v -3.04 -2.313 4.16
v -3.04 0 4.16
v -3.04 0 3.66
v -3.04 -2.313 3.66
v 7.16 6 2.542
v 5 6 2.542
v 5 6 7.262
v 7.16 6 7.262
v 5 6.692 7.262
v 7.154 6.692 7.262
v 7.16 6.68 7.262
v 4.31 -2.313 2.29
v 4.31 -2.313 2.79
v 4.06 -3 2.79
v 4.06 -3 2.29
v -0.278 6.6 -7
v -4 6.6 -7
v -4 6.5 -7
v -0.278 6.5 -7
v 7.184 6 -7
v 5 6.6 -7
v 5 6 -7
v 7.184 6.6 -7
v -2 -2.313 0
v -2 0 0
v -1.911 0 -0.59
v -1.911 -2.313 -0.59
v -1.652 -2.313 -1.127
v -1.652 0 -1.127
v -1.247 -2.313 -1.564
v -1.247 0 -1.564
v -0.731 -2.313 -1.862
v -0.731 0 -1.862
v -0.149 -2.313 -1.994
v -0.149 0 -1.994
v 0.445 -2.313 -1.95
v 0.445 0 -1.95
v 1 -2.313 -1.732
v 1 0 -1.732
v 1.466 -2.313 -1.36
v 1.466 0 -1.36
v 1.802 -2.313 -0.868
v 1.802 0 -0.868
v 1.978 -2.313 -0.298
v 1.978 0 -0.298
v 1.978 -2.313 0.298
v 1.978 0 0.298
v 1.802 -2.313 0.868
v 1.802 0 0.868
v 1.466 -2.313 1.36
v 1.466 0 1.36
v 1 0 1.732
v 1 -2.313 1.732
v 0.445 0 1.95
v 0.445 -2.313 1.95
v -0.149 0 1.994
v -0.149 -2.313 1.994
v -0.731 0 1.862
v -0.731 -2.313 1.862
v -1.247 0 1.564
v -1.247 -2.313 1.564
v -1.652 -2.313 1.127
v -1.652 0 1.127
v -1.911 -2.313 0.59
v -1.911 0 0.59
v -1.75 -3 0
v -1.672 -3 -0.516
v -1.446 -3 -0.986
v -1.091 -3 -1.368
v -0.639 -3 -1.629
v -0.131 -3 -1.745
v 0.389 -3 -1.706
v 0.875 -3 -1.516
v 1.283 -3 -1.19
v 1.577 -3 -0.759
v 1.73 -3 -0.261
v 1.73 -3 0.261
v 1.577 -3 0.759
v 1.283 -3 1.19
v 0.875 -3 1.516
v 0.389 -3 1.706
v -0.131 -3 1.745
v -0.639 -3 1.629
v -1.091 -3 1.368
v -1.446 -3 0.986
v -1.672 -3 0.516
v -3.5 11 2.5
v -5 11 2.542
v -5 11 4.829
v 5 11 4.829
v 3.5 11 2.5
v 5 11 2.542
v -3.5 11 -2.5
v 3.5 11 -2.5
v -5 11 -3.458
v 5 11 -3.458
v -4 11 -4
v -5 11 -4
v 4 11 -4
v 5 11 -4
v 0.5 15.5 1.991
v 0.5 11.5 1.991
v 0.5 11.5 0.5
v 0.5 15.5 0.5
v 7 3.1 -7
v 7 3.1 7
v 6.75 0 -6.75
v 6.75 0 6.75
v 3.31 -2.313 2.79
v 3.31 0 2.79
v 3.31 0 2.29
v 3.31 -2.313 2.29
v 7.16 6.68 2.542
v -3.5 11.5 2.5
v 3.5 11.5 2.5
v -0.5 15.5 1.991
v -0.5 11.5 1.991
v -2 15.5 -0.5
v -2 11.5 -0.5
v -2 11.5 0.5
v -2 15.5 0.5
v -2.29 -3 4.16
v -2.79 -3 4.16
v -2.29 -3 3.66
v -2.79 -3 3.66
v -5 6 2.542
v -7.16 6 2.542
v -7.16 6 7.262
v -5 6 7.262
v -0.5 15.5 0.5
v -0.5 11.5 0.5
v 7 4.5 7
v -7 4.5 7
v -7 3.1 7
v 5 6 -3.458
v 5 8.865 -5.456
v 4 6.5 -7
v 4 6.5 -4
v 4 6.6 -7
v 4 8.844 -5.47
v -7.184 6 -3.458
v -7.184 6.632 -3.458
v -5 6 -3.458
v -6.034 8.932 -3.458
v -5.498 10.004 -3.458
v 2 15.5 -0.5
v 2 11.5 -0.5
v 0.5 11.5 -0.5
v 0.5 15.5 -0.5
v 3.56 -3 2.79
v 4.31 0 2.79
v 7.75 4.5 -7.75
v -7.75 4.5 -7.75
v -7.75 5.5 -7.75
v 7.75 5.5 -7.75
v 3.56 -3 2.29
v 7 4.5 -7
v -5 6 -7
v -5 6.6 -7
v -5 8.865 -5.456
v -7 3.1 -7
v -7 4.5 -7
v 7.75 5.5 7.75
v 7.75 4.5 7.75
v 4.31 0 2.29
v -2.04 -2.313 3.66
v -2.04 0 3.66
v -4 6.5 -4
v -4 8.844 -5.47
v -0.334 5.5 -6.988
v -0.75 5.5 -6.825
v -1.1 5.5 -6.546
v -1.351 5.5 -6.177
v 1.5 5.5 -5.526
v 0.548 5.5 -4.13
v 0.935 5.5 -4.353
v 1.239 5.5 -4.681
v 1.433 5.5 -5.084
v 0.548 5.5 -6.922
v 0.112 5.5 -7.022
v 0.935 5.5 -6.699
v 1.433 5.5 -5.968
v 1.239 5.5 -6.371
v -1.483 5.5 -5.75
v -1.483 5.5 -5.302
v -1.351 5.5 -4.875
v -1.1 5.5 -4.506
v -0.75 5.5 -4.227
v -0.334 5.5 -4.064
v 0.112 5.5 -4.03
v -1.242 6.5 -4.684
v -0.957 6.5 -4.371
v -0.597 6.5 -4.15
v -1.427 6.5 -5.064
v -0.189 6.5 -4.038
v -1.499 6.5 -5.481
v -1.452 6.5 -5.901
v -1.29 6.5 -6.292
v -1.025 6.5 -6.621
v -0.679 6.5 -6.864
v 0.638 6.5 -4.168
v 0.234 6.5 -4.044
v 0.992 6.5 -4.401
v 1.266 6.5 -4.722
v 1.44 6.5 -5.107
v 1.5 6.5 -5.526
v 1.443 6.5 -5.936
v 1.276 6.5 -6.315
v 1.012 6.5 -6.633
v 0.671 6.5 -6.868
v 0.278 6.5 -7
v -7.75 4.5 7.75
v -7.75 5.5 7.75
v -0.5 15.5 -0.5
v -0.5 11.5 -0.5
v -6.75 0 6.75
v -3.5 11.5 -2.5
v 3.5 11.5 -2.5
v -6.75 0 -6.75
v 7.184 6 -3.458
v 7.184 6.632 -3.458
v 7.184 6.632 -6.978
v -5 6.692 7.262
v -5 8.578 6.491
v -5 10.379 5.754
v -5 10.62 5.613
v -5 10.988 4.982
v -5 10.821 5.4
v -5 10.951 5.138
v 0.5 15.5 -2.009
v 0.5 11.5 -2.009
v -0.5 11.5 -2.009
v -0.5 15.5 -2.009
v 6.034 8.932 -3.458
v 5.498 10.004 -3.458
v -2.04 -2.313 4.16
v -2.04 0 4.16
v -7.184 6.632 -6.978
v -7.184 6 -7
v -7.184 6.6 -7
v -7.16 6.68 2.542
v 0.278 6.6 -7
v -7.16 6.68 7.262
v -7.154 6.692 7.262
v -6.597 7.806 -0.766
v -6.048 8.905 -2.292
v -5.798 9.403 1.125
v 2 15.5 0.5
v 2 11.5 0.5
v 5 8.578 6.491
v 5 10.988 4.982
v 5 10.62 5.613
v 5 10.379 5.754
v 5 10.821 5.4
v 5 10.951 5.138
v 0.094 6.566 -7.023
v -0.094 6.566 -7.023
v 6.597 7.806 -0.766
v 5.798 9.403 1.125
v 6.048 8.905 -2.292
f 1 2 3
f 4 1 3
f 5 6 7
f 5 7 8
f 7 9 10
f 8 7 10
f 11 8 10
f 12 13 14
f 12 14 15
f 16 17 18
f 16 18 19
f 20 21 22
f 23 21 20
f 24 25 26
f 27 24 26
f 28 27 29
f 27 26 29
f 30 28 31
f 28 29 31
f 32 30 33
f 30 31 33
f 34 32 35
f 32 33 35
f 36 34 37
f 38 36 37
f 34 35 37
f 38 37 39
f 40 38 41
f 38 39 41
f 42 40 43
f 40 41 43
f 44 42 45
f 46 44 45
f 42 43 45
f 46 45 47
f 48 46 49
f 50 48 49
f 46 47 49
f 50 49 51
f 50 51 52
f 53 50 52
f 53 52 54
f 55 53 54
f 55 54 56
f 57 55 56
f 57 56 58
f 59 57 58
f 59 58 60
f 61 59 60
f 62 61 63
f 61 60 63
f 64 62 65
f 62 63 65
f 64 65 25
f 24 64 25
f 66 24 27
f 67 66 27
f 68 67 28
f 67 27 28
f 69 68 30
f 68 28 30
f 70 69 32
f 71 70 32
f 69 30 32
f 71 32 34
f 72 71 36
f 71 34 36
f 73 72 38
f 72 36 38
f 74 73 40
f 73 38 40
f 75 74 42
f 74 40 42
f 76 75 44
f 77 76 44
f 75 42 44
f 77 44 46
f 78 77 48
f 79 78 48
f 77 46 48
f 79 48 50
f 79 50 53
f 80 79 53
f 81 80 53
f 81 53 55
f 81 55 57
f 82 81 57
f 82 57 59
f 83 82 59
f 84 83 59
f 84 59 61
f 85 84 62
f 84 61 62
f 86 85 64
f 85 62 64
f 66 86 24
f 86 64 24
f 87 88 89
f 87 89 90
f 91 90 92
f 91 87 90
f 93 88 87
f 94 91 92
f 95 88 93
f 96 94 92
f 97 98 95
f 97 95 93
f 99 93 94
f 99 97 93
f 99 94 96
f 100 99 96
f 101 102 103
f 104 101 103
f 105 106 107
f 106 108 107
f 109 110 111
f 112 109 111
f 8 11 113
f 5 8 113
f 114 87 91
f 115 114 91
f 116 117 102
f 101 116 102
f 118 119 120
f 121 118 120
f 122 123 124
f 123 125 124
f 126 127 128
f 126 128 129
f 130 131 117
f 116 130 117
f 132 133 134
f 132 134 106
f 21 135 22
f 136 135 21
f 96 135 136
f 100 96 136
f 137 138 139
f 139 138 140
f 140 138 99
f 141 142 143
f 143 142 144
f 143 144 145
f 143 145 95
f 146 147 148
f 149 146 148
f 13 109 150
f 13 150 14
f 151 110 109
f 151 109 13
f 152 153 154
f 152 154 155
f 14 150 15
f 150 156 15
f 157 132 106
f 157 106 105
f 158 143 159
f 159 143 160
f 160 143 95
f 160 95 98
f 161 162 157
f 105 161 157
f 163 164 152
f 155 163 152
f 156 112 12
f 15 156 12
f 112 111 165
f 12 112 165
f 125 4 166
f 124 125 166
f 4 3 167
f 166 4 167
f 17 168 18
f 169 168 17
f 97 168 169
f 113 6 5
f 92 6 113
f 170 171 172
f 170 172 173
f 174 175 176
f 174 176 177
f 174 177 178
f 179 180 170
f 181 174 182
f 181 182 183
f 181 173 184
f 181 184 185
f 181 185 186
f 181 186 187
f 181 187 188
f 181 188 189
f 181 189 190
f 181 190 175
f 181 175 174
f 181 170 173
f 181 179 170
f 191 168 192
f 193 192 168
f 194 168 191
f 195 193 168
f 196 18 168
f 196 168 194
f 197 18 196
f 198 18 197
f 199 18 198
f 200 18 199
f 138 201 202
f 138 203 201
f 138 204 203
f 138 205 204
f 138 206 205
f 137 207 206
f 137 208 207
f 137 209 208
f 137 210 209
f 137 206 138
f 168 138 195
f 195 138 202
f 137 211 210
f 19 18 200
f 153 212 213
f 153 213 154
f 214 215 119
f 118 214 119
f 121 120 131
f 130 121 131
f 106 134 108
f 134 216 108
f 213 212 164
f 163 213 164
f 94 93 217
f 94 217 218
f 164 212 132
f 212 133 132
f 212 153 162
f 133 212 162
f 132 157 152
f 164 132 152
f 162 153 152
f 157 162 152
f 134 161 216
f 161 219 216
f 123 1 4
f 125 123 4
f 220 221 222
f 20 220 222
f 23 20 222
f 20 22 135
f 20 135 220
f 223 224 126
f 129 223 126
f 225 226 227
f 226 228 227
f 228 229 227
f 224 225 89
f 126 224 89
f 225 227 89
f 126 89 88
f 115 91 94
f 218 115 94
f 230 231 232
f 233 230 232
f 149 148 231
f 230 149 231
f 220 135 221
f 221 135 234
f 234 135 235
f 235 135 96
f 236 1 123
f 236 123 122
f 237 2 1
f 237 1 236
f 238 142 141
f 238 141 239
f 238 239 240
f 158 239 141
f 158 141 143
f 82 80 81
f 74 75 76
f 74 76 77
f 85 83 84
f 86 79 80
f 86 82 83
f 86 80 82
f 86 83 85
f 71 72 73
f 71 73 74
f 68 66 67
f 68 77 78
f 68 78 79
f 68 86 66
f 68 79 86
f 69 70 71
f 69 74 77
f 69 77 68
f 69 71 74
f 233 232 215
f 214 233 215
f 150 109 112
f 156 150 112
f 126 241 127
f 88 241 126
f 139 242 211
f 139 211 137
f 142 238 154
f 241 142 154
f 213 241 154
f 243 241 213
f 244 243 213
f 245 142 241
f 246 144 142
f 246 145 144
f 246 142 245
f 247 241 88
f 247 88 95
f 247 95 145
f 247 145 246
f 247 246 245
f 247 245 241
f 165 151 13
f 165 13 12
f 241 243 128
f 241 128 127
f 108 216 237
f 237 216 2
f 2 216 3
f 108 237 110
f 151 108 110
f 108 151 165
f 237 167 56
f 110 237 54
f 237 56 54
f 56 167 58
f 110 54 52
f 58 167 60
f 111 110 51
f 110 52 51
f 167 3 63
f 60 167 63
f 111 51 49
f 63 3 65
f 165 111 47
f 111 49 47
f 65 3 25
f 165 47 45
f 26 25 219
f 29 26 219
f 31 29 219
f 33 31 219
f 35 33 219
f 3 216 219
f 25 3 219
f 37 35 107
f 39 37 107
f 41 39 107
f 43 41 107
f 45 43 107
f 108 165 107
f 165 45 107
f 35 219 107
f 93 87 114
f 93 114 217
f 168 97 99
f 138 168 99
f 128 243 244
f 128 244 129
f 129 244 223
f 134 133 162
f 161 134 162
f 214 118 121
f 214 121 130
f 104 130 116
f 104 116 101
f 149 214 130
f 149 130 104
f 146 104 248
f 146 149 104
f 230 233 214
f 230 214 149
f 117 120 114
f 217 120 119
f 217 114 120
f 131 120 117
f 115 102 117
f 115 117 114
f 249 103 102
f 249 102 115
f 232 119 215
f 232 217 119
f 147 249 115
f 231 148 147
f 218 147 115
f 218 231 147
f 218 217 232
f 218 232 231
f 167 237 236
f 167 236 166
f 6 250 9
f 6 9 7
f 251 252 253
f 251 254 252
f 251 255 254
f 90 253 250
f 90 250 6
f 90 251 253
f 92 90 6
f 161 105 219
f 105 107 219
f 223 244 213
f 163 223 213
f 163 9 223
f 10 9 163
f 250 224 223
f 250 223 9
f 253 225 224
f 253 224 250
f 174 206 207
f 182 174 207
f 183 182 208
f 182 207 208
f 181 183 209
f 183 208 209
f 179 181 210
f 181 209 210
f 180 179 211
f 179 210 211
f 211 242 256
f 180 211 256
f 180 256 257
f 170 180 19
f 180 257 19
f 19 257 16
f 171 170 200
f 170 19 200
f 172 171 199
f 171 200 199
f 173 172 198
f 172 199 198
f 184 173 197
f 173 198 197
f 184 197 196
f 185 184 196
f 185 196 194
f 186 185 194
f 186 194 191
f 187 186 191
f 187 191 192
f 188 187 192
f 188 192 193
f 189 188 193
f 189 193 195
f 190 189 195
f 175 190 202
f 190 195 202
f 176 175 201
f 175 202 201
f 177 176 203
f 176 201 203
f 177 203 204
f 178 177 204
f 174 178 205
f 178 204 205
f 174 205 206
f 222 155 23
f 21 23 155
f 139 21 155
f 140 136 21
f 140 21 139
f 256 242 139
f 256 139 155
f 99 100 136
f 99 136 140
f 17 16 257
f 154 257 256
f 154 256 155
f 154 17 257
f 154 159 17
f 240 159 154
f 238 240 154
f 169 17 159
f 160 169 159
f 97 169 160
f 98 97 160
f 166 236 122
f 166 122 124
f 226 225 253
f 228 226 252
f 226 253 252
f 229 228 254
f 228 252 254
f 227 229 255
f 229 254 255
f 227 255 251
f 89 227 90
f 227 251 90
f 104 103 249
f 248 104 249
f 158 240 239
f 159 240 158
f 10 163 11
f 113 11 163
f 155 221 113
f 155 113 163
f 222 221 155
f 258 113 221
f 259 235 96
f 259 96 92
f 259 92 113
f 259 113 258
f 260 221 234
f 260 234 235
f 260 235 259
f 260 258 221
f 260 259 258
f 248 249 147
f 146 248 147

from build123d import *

# Parameters (mm, degrees)
SKETCH_2_W           = 14
SKETCH_2_H           = 14
EXTRUDE_1_DEPTH      = 1.4
SKETCH_1_W           = 13.5
SKETCH_1_H           = 13.5
SKETCH_8_W           = 15.5
SKETCH_8_H           = 15.5
EXTRUDE_2_DEPTH      = 1
SKETCH_10_W          = 10
SKETCH_10_H          = 9.5
SKETCH_12_W          = 7
SKETCH_12_H          = 5
EXTRUDE_3_DEPTH      = 0.5
EXTRUDE_5_DEPTH      = 4
SKETCH_16_R          = 2
EXTRUDE_6_DEPTH      = 3
CHAMFER_1_SIZE       = 0.25
CHAMFER_1_SIZE2      = 0.686869355
SKETCH_18_W          = 8
SKETCH_18_H          = 3
CUT_EXTRUDE_1_DEPTH  = 4.5
SKETCH_20_W          = 2.183812488
SKETCH_20_H          = 3.542412762
CUT_EXTRUDE_9_DEPTH  = 5
SKETCH_23_W          = 2.16
SKETCH_23_H          = 4.720066995
CUT_EXTRUDE_10_DEPTH = 5
SKETCH_26_R          = 1.5
CUT_EXTRUDE_12_DEPTH = 5.5
SKETCH_27_W          = 1
SKETCH_27_H          = 0.5
EXTRUDE_7_DEPTH      = 3
CHAMFER_2_SIZE       = 0.25
CHAMFER_2_SIZE2      = 0.686869355
CHAMFER_3_SIZE       = 0.25
CHAMFER_3_SIZE2      = 0.686869355
FILLET_1_R           = 1


with BuildPart() as part:
    # 草图2 → 凸台-拉伸1 (new body)
    with BuildSketch(Plane(origin=(0, 4.5, 0), x_dir=(1, 0, 0), z_dir=(0, 1, 0))):
        Rectangle(SKETCH_2_W, SKETCH_2_H)
    extrude(amount=-EXTRUDE_1_DEPTH)

    # 草图1 → section 1 of loft_2
    with BuildSketch(Plane(origin=(0, 0, 0), x_dir=(1, 0, 0), z_dir=(0, 1, 0)), mode=Mode.PRIVATE) as loft_2_s1:
        Rectangle(SKETCH_1_W, SKETCH_1_H)
    # loft from a face of the part (loft_2)
    loft([part.faces().sort_by_distance((0, 3.1, 0))[0], loft_2_s1.sketch])

    # 草图8 → 凸台-拉伸2 (add)
    with BuildSketch(Plane(origin=(0, 4.5, 0), x_dir=(1, 0, 0), z_dir=(0, 1, 0))):
        Rectangle(SKETCH_8_W, SKETCH_8_H)
    extrude(amount=EXTRUDE_2_DEPTH)

    # 草图10 → section 1 of loft_6
    with BuildSketch(Plane(origin=(0, 11, 0), x_dir=(1, 0, 0), z_dir=(0, 1, 0)), mode=Mode.PRIVATE) as loft_6_s1:
        with Locations((0, -0.75)):
            Rectangle(SKETCH_10_W, SKETCH_10_H)
    # loft from a face of the part (loft_6)
    loft([part.faces().sort_by_distance((0, 5.5, 0))[0], loft_6_s1.sketch])

    # 草图12 → 凸台-拉伸3 (add)
    with BuildSketch(Plane(origin=(0, 11, 0), x_dir=(1, 0, 0), z_dir=(0, 1, 0))):
        Rectangle(SKETCH_12_W, SKETCH_12_H)
    extrude(amount=EXTRUDE_3_DEPTH)

    # 草图14 → 凸台-拉伸5 (add)
    with BuildSketch(Plane(origin=(0, 11.5, 0), x_dir=(1, 0, 0), z_dir=(0, 1, 0))):
        Polygon((0.5, -0.5), (2, -0.5), (2, 0.5), (0.5, 0.5), (0.5, 2.008619841), (-0.5, 2.008619841), (-0.5, 0.5), (-2, 0.5), (-2, -0.5), (-0.5, -0.5), (-0.5, -1.991380159), (0.5, -1.991380159), align=None)
    extrude(amount=EXTRUDE_5_DEPTH)

    # 草图16 → 凸台-拉伸6 (add)
    with BuildSketch(Plane(origin=(0, 0, 0), x_dir=(-1, 0, 0), z_dir=(0, -1, 0))):
        Circle(SKETCH_16_R)
    extrude(amount=EXTRUDE_6_DEPTH)

    # 倒角1
    chamfer_1_edges = [part.edges().sort_by_distance(p)[0] for p in [
        (2, -3, 0),
    ]]
    chamfer_1_side = [part.faces().sort_by_distance(p)[0] for p in [
        (0, -3, 0),
    ]]
    chamfer(chamfer_1_edges, length=CHAMFER_1_SIZE, length2=CHAMFER_1_SIZE2, reference=chamfer_1_side[0])

    # 草图18 → 切除-拉伸1 (cut)
    with BuildSketch(Plane(origin=(0, 11, 0), x_dir=(1, 0, 0), z_dir=(0, 1, 0))):
        with Locations((0, 5.5)):
            Rectangle(SKETCH_18_W, SKETCH_18_H)
    extrude(amount=-CUT_EXTRUDE_1_DEPTH, mode=Mode.SUBTRACT)

    # 草图20 → 切除-拉伸9 (cut)
    with BuildSketch(Plane(origin=(0, 11, 0), x_dir=(1, 0, 0), z_dir=(0, 1, 0))):
        with Locations((6.091906244, 5.228793619)):
            Rectangle(SKETCH_20_W, SKETCH_20_H)
        with Locations((-6.091906244, 5.228793619)):
            Rectangle(SKETCH_20_W, SKETCH_20_H)
    extrude(amount=-CUT_EXTRUDE_9_DEPTH, mode=Mode.SUBTRACT)

    # 草图23 → 切除-拉伸10 (cut)
    with BuildSketch(Plane(origin=(0, 11, 0), x_dir=(1, 0, 0), z_dir=(0, 1, 0))):
        with Locations((6.08, -4.90244626)):
            Rectangle(SKETCH_23_W, SKETCH_23_H)
        with Locations((-6.08, -4.90244626)):
            Rectangle(SKETCH_23_W, SKETCH_23_H)
    extrude(amount=-CUT_EXTRUDE_10_DEPTH, mode=Mode.SUBTRACT)

    # 草图26 → 切除-拉伸12 (cut)
    with BuildSketch(Plane(origin=(0, 11, 0), x_dir=(1, 0, 0), z_dir=(0, 1, 0))):
        with Locations((0, 5.526038024)):
            Circle(SKETCH_26_R)
    extrude(amount=-CUT_EXTRUDE_12_DEPTH, mode=Mode.SUBTRACT)

    # 草图27 → 凸台-拉伸7 (add)
    with BuildSketch(Plane(origin=(0, 0, 0), x_dir=(1, 0, 0), z_dir=(0, 1, 0))):
        with Locations((-2.54, -3.91)):
            Rectangle(SKETCH_27_W, SKETCH_27_H)
        with Locations((3.81, -2.54)):
            Rectangle(SKETCH_27_W, SKETCH_27_H)
    extrude(amount=-EXTRUDE_7_DEPTH)

    # 倒角2
    chamfer_2_edges = [part.edges().sort_by_distance(p)[0] for p in [
        (4.31, -3, 2.54),
        (3.31, -3, 2.54),
    ]]
    chamfer_2_side = [part.faces().sort_by_distance(p)[0] for p in [
        (3.81, -3, 2.54),
    ]]
    chamfer(chamfer_2_edges, length=CHAMFER_2_SIZE, length2=CHAMFER_2_SIZE2, reference=chamfer_2_side[0])

    # 倒角3
    chamfer_3_edges = [part.edges().sort_by_distance(p)[0] for p in [
        (-2.04, -3, 3.91),
        (-3.04, -3, 3.91),
    ]]
    chamfer_3_side = [part.faces().sort_by_distance(p)[0] for p in [
        (-2.54, -3, 3.91),
    ]]
    chamfer(chamfer_3_edges, length=CHAMFER_3_SIZE, length2=CHAMFER_3_SIZE2, reference=chamfer_3_side[0])

    # 圆角1
    fillet_1_edges = [part.edges().sort_by_distance(p)[0] for p in [
        (0, 11, 5.5),
    ]]
    fillet(fillet_1_edges, radius=FILLET_1_R)


solid = part.part
